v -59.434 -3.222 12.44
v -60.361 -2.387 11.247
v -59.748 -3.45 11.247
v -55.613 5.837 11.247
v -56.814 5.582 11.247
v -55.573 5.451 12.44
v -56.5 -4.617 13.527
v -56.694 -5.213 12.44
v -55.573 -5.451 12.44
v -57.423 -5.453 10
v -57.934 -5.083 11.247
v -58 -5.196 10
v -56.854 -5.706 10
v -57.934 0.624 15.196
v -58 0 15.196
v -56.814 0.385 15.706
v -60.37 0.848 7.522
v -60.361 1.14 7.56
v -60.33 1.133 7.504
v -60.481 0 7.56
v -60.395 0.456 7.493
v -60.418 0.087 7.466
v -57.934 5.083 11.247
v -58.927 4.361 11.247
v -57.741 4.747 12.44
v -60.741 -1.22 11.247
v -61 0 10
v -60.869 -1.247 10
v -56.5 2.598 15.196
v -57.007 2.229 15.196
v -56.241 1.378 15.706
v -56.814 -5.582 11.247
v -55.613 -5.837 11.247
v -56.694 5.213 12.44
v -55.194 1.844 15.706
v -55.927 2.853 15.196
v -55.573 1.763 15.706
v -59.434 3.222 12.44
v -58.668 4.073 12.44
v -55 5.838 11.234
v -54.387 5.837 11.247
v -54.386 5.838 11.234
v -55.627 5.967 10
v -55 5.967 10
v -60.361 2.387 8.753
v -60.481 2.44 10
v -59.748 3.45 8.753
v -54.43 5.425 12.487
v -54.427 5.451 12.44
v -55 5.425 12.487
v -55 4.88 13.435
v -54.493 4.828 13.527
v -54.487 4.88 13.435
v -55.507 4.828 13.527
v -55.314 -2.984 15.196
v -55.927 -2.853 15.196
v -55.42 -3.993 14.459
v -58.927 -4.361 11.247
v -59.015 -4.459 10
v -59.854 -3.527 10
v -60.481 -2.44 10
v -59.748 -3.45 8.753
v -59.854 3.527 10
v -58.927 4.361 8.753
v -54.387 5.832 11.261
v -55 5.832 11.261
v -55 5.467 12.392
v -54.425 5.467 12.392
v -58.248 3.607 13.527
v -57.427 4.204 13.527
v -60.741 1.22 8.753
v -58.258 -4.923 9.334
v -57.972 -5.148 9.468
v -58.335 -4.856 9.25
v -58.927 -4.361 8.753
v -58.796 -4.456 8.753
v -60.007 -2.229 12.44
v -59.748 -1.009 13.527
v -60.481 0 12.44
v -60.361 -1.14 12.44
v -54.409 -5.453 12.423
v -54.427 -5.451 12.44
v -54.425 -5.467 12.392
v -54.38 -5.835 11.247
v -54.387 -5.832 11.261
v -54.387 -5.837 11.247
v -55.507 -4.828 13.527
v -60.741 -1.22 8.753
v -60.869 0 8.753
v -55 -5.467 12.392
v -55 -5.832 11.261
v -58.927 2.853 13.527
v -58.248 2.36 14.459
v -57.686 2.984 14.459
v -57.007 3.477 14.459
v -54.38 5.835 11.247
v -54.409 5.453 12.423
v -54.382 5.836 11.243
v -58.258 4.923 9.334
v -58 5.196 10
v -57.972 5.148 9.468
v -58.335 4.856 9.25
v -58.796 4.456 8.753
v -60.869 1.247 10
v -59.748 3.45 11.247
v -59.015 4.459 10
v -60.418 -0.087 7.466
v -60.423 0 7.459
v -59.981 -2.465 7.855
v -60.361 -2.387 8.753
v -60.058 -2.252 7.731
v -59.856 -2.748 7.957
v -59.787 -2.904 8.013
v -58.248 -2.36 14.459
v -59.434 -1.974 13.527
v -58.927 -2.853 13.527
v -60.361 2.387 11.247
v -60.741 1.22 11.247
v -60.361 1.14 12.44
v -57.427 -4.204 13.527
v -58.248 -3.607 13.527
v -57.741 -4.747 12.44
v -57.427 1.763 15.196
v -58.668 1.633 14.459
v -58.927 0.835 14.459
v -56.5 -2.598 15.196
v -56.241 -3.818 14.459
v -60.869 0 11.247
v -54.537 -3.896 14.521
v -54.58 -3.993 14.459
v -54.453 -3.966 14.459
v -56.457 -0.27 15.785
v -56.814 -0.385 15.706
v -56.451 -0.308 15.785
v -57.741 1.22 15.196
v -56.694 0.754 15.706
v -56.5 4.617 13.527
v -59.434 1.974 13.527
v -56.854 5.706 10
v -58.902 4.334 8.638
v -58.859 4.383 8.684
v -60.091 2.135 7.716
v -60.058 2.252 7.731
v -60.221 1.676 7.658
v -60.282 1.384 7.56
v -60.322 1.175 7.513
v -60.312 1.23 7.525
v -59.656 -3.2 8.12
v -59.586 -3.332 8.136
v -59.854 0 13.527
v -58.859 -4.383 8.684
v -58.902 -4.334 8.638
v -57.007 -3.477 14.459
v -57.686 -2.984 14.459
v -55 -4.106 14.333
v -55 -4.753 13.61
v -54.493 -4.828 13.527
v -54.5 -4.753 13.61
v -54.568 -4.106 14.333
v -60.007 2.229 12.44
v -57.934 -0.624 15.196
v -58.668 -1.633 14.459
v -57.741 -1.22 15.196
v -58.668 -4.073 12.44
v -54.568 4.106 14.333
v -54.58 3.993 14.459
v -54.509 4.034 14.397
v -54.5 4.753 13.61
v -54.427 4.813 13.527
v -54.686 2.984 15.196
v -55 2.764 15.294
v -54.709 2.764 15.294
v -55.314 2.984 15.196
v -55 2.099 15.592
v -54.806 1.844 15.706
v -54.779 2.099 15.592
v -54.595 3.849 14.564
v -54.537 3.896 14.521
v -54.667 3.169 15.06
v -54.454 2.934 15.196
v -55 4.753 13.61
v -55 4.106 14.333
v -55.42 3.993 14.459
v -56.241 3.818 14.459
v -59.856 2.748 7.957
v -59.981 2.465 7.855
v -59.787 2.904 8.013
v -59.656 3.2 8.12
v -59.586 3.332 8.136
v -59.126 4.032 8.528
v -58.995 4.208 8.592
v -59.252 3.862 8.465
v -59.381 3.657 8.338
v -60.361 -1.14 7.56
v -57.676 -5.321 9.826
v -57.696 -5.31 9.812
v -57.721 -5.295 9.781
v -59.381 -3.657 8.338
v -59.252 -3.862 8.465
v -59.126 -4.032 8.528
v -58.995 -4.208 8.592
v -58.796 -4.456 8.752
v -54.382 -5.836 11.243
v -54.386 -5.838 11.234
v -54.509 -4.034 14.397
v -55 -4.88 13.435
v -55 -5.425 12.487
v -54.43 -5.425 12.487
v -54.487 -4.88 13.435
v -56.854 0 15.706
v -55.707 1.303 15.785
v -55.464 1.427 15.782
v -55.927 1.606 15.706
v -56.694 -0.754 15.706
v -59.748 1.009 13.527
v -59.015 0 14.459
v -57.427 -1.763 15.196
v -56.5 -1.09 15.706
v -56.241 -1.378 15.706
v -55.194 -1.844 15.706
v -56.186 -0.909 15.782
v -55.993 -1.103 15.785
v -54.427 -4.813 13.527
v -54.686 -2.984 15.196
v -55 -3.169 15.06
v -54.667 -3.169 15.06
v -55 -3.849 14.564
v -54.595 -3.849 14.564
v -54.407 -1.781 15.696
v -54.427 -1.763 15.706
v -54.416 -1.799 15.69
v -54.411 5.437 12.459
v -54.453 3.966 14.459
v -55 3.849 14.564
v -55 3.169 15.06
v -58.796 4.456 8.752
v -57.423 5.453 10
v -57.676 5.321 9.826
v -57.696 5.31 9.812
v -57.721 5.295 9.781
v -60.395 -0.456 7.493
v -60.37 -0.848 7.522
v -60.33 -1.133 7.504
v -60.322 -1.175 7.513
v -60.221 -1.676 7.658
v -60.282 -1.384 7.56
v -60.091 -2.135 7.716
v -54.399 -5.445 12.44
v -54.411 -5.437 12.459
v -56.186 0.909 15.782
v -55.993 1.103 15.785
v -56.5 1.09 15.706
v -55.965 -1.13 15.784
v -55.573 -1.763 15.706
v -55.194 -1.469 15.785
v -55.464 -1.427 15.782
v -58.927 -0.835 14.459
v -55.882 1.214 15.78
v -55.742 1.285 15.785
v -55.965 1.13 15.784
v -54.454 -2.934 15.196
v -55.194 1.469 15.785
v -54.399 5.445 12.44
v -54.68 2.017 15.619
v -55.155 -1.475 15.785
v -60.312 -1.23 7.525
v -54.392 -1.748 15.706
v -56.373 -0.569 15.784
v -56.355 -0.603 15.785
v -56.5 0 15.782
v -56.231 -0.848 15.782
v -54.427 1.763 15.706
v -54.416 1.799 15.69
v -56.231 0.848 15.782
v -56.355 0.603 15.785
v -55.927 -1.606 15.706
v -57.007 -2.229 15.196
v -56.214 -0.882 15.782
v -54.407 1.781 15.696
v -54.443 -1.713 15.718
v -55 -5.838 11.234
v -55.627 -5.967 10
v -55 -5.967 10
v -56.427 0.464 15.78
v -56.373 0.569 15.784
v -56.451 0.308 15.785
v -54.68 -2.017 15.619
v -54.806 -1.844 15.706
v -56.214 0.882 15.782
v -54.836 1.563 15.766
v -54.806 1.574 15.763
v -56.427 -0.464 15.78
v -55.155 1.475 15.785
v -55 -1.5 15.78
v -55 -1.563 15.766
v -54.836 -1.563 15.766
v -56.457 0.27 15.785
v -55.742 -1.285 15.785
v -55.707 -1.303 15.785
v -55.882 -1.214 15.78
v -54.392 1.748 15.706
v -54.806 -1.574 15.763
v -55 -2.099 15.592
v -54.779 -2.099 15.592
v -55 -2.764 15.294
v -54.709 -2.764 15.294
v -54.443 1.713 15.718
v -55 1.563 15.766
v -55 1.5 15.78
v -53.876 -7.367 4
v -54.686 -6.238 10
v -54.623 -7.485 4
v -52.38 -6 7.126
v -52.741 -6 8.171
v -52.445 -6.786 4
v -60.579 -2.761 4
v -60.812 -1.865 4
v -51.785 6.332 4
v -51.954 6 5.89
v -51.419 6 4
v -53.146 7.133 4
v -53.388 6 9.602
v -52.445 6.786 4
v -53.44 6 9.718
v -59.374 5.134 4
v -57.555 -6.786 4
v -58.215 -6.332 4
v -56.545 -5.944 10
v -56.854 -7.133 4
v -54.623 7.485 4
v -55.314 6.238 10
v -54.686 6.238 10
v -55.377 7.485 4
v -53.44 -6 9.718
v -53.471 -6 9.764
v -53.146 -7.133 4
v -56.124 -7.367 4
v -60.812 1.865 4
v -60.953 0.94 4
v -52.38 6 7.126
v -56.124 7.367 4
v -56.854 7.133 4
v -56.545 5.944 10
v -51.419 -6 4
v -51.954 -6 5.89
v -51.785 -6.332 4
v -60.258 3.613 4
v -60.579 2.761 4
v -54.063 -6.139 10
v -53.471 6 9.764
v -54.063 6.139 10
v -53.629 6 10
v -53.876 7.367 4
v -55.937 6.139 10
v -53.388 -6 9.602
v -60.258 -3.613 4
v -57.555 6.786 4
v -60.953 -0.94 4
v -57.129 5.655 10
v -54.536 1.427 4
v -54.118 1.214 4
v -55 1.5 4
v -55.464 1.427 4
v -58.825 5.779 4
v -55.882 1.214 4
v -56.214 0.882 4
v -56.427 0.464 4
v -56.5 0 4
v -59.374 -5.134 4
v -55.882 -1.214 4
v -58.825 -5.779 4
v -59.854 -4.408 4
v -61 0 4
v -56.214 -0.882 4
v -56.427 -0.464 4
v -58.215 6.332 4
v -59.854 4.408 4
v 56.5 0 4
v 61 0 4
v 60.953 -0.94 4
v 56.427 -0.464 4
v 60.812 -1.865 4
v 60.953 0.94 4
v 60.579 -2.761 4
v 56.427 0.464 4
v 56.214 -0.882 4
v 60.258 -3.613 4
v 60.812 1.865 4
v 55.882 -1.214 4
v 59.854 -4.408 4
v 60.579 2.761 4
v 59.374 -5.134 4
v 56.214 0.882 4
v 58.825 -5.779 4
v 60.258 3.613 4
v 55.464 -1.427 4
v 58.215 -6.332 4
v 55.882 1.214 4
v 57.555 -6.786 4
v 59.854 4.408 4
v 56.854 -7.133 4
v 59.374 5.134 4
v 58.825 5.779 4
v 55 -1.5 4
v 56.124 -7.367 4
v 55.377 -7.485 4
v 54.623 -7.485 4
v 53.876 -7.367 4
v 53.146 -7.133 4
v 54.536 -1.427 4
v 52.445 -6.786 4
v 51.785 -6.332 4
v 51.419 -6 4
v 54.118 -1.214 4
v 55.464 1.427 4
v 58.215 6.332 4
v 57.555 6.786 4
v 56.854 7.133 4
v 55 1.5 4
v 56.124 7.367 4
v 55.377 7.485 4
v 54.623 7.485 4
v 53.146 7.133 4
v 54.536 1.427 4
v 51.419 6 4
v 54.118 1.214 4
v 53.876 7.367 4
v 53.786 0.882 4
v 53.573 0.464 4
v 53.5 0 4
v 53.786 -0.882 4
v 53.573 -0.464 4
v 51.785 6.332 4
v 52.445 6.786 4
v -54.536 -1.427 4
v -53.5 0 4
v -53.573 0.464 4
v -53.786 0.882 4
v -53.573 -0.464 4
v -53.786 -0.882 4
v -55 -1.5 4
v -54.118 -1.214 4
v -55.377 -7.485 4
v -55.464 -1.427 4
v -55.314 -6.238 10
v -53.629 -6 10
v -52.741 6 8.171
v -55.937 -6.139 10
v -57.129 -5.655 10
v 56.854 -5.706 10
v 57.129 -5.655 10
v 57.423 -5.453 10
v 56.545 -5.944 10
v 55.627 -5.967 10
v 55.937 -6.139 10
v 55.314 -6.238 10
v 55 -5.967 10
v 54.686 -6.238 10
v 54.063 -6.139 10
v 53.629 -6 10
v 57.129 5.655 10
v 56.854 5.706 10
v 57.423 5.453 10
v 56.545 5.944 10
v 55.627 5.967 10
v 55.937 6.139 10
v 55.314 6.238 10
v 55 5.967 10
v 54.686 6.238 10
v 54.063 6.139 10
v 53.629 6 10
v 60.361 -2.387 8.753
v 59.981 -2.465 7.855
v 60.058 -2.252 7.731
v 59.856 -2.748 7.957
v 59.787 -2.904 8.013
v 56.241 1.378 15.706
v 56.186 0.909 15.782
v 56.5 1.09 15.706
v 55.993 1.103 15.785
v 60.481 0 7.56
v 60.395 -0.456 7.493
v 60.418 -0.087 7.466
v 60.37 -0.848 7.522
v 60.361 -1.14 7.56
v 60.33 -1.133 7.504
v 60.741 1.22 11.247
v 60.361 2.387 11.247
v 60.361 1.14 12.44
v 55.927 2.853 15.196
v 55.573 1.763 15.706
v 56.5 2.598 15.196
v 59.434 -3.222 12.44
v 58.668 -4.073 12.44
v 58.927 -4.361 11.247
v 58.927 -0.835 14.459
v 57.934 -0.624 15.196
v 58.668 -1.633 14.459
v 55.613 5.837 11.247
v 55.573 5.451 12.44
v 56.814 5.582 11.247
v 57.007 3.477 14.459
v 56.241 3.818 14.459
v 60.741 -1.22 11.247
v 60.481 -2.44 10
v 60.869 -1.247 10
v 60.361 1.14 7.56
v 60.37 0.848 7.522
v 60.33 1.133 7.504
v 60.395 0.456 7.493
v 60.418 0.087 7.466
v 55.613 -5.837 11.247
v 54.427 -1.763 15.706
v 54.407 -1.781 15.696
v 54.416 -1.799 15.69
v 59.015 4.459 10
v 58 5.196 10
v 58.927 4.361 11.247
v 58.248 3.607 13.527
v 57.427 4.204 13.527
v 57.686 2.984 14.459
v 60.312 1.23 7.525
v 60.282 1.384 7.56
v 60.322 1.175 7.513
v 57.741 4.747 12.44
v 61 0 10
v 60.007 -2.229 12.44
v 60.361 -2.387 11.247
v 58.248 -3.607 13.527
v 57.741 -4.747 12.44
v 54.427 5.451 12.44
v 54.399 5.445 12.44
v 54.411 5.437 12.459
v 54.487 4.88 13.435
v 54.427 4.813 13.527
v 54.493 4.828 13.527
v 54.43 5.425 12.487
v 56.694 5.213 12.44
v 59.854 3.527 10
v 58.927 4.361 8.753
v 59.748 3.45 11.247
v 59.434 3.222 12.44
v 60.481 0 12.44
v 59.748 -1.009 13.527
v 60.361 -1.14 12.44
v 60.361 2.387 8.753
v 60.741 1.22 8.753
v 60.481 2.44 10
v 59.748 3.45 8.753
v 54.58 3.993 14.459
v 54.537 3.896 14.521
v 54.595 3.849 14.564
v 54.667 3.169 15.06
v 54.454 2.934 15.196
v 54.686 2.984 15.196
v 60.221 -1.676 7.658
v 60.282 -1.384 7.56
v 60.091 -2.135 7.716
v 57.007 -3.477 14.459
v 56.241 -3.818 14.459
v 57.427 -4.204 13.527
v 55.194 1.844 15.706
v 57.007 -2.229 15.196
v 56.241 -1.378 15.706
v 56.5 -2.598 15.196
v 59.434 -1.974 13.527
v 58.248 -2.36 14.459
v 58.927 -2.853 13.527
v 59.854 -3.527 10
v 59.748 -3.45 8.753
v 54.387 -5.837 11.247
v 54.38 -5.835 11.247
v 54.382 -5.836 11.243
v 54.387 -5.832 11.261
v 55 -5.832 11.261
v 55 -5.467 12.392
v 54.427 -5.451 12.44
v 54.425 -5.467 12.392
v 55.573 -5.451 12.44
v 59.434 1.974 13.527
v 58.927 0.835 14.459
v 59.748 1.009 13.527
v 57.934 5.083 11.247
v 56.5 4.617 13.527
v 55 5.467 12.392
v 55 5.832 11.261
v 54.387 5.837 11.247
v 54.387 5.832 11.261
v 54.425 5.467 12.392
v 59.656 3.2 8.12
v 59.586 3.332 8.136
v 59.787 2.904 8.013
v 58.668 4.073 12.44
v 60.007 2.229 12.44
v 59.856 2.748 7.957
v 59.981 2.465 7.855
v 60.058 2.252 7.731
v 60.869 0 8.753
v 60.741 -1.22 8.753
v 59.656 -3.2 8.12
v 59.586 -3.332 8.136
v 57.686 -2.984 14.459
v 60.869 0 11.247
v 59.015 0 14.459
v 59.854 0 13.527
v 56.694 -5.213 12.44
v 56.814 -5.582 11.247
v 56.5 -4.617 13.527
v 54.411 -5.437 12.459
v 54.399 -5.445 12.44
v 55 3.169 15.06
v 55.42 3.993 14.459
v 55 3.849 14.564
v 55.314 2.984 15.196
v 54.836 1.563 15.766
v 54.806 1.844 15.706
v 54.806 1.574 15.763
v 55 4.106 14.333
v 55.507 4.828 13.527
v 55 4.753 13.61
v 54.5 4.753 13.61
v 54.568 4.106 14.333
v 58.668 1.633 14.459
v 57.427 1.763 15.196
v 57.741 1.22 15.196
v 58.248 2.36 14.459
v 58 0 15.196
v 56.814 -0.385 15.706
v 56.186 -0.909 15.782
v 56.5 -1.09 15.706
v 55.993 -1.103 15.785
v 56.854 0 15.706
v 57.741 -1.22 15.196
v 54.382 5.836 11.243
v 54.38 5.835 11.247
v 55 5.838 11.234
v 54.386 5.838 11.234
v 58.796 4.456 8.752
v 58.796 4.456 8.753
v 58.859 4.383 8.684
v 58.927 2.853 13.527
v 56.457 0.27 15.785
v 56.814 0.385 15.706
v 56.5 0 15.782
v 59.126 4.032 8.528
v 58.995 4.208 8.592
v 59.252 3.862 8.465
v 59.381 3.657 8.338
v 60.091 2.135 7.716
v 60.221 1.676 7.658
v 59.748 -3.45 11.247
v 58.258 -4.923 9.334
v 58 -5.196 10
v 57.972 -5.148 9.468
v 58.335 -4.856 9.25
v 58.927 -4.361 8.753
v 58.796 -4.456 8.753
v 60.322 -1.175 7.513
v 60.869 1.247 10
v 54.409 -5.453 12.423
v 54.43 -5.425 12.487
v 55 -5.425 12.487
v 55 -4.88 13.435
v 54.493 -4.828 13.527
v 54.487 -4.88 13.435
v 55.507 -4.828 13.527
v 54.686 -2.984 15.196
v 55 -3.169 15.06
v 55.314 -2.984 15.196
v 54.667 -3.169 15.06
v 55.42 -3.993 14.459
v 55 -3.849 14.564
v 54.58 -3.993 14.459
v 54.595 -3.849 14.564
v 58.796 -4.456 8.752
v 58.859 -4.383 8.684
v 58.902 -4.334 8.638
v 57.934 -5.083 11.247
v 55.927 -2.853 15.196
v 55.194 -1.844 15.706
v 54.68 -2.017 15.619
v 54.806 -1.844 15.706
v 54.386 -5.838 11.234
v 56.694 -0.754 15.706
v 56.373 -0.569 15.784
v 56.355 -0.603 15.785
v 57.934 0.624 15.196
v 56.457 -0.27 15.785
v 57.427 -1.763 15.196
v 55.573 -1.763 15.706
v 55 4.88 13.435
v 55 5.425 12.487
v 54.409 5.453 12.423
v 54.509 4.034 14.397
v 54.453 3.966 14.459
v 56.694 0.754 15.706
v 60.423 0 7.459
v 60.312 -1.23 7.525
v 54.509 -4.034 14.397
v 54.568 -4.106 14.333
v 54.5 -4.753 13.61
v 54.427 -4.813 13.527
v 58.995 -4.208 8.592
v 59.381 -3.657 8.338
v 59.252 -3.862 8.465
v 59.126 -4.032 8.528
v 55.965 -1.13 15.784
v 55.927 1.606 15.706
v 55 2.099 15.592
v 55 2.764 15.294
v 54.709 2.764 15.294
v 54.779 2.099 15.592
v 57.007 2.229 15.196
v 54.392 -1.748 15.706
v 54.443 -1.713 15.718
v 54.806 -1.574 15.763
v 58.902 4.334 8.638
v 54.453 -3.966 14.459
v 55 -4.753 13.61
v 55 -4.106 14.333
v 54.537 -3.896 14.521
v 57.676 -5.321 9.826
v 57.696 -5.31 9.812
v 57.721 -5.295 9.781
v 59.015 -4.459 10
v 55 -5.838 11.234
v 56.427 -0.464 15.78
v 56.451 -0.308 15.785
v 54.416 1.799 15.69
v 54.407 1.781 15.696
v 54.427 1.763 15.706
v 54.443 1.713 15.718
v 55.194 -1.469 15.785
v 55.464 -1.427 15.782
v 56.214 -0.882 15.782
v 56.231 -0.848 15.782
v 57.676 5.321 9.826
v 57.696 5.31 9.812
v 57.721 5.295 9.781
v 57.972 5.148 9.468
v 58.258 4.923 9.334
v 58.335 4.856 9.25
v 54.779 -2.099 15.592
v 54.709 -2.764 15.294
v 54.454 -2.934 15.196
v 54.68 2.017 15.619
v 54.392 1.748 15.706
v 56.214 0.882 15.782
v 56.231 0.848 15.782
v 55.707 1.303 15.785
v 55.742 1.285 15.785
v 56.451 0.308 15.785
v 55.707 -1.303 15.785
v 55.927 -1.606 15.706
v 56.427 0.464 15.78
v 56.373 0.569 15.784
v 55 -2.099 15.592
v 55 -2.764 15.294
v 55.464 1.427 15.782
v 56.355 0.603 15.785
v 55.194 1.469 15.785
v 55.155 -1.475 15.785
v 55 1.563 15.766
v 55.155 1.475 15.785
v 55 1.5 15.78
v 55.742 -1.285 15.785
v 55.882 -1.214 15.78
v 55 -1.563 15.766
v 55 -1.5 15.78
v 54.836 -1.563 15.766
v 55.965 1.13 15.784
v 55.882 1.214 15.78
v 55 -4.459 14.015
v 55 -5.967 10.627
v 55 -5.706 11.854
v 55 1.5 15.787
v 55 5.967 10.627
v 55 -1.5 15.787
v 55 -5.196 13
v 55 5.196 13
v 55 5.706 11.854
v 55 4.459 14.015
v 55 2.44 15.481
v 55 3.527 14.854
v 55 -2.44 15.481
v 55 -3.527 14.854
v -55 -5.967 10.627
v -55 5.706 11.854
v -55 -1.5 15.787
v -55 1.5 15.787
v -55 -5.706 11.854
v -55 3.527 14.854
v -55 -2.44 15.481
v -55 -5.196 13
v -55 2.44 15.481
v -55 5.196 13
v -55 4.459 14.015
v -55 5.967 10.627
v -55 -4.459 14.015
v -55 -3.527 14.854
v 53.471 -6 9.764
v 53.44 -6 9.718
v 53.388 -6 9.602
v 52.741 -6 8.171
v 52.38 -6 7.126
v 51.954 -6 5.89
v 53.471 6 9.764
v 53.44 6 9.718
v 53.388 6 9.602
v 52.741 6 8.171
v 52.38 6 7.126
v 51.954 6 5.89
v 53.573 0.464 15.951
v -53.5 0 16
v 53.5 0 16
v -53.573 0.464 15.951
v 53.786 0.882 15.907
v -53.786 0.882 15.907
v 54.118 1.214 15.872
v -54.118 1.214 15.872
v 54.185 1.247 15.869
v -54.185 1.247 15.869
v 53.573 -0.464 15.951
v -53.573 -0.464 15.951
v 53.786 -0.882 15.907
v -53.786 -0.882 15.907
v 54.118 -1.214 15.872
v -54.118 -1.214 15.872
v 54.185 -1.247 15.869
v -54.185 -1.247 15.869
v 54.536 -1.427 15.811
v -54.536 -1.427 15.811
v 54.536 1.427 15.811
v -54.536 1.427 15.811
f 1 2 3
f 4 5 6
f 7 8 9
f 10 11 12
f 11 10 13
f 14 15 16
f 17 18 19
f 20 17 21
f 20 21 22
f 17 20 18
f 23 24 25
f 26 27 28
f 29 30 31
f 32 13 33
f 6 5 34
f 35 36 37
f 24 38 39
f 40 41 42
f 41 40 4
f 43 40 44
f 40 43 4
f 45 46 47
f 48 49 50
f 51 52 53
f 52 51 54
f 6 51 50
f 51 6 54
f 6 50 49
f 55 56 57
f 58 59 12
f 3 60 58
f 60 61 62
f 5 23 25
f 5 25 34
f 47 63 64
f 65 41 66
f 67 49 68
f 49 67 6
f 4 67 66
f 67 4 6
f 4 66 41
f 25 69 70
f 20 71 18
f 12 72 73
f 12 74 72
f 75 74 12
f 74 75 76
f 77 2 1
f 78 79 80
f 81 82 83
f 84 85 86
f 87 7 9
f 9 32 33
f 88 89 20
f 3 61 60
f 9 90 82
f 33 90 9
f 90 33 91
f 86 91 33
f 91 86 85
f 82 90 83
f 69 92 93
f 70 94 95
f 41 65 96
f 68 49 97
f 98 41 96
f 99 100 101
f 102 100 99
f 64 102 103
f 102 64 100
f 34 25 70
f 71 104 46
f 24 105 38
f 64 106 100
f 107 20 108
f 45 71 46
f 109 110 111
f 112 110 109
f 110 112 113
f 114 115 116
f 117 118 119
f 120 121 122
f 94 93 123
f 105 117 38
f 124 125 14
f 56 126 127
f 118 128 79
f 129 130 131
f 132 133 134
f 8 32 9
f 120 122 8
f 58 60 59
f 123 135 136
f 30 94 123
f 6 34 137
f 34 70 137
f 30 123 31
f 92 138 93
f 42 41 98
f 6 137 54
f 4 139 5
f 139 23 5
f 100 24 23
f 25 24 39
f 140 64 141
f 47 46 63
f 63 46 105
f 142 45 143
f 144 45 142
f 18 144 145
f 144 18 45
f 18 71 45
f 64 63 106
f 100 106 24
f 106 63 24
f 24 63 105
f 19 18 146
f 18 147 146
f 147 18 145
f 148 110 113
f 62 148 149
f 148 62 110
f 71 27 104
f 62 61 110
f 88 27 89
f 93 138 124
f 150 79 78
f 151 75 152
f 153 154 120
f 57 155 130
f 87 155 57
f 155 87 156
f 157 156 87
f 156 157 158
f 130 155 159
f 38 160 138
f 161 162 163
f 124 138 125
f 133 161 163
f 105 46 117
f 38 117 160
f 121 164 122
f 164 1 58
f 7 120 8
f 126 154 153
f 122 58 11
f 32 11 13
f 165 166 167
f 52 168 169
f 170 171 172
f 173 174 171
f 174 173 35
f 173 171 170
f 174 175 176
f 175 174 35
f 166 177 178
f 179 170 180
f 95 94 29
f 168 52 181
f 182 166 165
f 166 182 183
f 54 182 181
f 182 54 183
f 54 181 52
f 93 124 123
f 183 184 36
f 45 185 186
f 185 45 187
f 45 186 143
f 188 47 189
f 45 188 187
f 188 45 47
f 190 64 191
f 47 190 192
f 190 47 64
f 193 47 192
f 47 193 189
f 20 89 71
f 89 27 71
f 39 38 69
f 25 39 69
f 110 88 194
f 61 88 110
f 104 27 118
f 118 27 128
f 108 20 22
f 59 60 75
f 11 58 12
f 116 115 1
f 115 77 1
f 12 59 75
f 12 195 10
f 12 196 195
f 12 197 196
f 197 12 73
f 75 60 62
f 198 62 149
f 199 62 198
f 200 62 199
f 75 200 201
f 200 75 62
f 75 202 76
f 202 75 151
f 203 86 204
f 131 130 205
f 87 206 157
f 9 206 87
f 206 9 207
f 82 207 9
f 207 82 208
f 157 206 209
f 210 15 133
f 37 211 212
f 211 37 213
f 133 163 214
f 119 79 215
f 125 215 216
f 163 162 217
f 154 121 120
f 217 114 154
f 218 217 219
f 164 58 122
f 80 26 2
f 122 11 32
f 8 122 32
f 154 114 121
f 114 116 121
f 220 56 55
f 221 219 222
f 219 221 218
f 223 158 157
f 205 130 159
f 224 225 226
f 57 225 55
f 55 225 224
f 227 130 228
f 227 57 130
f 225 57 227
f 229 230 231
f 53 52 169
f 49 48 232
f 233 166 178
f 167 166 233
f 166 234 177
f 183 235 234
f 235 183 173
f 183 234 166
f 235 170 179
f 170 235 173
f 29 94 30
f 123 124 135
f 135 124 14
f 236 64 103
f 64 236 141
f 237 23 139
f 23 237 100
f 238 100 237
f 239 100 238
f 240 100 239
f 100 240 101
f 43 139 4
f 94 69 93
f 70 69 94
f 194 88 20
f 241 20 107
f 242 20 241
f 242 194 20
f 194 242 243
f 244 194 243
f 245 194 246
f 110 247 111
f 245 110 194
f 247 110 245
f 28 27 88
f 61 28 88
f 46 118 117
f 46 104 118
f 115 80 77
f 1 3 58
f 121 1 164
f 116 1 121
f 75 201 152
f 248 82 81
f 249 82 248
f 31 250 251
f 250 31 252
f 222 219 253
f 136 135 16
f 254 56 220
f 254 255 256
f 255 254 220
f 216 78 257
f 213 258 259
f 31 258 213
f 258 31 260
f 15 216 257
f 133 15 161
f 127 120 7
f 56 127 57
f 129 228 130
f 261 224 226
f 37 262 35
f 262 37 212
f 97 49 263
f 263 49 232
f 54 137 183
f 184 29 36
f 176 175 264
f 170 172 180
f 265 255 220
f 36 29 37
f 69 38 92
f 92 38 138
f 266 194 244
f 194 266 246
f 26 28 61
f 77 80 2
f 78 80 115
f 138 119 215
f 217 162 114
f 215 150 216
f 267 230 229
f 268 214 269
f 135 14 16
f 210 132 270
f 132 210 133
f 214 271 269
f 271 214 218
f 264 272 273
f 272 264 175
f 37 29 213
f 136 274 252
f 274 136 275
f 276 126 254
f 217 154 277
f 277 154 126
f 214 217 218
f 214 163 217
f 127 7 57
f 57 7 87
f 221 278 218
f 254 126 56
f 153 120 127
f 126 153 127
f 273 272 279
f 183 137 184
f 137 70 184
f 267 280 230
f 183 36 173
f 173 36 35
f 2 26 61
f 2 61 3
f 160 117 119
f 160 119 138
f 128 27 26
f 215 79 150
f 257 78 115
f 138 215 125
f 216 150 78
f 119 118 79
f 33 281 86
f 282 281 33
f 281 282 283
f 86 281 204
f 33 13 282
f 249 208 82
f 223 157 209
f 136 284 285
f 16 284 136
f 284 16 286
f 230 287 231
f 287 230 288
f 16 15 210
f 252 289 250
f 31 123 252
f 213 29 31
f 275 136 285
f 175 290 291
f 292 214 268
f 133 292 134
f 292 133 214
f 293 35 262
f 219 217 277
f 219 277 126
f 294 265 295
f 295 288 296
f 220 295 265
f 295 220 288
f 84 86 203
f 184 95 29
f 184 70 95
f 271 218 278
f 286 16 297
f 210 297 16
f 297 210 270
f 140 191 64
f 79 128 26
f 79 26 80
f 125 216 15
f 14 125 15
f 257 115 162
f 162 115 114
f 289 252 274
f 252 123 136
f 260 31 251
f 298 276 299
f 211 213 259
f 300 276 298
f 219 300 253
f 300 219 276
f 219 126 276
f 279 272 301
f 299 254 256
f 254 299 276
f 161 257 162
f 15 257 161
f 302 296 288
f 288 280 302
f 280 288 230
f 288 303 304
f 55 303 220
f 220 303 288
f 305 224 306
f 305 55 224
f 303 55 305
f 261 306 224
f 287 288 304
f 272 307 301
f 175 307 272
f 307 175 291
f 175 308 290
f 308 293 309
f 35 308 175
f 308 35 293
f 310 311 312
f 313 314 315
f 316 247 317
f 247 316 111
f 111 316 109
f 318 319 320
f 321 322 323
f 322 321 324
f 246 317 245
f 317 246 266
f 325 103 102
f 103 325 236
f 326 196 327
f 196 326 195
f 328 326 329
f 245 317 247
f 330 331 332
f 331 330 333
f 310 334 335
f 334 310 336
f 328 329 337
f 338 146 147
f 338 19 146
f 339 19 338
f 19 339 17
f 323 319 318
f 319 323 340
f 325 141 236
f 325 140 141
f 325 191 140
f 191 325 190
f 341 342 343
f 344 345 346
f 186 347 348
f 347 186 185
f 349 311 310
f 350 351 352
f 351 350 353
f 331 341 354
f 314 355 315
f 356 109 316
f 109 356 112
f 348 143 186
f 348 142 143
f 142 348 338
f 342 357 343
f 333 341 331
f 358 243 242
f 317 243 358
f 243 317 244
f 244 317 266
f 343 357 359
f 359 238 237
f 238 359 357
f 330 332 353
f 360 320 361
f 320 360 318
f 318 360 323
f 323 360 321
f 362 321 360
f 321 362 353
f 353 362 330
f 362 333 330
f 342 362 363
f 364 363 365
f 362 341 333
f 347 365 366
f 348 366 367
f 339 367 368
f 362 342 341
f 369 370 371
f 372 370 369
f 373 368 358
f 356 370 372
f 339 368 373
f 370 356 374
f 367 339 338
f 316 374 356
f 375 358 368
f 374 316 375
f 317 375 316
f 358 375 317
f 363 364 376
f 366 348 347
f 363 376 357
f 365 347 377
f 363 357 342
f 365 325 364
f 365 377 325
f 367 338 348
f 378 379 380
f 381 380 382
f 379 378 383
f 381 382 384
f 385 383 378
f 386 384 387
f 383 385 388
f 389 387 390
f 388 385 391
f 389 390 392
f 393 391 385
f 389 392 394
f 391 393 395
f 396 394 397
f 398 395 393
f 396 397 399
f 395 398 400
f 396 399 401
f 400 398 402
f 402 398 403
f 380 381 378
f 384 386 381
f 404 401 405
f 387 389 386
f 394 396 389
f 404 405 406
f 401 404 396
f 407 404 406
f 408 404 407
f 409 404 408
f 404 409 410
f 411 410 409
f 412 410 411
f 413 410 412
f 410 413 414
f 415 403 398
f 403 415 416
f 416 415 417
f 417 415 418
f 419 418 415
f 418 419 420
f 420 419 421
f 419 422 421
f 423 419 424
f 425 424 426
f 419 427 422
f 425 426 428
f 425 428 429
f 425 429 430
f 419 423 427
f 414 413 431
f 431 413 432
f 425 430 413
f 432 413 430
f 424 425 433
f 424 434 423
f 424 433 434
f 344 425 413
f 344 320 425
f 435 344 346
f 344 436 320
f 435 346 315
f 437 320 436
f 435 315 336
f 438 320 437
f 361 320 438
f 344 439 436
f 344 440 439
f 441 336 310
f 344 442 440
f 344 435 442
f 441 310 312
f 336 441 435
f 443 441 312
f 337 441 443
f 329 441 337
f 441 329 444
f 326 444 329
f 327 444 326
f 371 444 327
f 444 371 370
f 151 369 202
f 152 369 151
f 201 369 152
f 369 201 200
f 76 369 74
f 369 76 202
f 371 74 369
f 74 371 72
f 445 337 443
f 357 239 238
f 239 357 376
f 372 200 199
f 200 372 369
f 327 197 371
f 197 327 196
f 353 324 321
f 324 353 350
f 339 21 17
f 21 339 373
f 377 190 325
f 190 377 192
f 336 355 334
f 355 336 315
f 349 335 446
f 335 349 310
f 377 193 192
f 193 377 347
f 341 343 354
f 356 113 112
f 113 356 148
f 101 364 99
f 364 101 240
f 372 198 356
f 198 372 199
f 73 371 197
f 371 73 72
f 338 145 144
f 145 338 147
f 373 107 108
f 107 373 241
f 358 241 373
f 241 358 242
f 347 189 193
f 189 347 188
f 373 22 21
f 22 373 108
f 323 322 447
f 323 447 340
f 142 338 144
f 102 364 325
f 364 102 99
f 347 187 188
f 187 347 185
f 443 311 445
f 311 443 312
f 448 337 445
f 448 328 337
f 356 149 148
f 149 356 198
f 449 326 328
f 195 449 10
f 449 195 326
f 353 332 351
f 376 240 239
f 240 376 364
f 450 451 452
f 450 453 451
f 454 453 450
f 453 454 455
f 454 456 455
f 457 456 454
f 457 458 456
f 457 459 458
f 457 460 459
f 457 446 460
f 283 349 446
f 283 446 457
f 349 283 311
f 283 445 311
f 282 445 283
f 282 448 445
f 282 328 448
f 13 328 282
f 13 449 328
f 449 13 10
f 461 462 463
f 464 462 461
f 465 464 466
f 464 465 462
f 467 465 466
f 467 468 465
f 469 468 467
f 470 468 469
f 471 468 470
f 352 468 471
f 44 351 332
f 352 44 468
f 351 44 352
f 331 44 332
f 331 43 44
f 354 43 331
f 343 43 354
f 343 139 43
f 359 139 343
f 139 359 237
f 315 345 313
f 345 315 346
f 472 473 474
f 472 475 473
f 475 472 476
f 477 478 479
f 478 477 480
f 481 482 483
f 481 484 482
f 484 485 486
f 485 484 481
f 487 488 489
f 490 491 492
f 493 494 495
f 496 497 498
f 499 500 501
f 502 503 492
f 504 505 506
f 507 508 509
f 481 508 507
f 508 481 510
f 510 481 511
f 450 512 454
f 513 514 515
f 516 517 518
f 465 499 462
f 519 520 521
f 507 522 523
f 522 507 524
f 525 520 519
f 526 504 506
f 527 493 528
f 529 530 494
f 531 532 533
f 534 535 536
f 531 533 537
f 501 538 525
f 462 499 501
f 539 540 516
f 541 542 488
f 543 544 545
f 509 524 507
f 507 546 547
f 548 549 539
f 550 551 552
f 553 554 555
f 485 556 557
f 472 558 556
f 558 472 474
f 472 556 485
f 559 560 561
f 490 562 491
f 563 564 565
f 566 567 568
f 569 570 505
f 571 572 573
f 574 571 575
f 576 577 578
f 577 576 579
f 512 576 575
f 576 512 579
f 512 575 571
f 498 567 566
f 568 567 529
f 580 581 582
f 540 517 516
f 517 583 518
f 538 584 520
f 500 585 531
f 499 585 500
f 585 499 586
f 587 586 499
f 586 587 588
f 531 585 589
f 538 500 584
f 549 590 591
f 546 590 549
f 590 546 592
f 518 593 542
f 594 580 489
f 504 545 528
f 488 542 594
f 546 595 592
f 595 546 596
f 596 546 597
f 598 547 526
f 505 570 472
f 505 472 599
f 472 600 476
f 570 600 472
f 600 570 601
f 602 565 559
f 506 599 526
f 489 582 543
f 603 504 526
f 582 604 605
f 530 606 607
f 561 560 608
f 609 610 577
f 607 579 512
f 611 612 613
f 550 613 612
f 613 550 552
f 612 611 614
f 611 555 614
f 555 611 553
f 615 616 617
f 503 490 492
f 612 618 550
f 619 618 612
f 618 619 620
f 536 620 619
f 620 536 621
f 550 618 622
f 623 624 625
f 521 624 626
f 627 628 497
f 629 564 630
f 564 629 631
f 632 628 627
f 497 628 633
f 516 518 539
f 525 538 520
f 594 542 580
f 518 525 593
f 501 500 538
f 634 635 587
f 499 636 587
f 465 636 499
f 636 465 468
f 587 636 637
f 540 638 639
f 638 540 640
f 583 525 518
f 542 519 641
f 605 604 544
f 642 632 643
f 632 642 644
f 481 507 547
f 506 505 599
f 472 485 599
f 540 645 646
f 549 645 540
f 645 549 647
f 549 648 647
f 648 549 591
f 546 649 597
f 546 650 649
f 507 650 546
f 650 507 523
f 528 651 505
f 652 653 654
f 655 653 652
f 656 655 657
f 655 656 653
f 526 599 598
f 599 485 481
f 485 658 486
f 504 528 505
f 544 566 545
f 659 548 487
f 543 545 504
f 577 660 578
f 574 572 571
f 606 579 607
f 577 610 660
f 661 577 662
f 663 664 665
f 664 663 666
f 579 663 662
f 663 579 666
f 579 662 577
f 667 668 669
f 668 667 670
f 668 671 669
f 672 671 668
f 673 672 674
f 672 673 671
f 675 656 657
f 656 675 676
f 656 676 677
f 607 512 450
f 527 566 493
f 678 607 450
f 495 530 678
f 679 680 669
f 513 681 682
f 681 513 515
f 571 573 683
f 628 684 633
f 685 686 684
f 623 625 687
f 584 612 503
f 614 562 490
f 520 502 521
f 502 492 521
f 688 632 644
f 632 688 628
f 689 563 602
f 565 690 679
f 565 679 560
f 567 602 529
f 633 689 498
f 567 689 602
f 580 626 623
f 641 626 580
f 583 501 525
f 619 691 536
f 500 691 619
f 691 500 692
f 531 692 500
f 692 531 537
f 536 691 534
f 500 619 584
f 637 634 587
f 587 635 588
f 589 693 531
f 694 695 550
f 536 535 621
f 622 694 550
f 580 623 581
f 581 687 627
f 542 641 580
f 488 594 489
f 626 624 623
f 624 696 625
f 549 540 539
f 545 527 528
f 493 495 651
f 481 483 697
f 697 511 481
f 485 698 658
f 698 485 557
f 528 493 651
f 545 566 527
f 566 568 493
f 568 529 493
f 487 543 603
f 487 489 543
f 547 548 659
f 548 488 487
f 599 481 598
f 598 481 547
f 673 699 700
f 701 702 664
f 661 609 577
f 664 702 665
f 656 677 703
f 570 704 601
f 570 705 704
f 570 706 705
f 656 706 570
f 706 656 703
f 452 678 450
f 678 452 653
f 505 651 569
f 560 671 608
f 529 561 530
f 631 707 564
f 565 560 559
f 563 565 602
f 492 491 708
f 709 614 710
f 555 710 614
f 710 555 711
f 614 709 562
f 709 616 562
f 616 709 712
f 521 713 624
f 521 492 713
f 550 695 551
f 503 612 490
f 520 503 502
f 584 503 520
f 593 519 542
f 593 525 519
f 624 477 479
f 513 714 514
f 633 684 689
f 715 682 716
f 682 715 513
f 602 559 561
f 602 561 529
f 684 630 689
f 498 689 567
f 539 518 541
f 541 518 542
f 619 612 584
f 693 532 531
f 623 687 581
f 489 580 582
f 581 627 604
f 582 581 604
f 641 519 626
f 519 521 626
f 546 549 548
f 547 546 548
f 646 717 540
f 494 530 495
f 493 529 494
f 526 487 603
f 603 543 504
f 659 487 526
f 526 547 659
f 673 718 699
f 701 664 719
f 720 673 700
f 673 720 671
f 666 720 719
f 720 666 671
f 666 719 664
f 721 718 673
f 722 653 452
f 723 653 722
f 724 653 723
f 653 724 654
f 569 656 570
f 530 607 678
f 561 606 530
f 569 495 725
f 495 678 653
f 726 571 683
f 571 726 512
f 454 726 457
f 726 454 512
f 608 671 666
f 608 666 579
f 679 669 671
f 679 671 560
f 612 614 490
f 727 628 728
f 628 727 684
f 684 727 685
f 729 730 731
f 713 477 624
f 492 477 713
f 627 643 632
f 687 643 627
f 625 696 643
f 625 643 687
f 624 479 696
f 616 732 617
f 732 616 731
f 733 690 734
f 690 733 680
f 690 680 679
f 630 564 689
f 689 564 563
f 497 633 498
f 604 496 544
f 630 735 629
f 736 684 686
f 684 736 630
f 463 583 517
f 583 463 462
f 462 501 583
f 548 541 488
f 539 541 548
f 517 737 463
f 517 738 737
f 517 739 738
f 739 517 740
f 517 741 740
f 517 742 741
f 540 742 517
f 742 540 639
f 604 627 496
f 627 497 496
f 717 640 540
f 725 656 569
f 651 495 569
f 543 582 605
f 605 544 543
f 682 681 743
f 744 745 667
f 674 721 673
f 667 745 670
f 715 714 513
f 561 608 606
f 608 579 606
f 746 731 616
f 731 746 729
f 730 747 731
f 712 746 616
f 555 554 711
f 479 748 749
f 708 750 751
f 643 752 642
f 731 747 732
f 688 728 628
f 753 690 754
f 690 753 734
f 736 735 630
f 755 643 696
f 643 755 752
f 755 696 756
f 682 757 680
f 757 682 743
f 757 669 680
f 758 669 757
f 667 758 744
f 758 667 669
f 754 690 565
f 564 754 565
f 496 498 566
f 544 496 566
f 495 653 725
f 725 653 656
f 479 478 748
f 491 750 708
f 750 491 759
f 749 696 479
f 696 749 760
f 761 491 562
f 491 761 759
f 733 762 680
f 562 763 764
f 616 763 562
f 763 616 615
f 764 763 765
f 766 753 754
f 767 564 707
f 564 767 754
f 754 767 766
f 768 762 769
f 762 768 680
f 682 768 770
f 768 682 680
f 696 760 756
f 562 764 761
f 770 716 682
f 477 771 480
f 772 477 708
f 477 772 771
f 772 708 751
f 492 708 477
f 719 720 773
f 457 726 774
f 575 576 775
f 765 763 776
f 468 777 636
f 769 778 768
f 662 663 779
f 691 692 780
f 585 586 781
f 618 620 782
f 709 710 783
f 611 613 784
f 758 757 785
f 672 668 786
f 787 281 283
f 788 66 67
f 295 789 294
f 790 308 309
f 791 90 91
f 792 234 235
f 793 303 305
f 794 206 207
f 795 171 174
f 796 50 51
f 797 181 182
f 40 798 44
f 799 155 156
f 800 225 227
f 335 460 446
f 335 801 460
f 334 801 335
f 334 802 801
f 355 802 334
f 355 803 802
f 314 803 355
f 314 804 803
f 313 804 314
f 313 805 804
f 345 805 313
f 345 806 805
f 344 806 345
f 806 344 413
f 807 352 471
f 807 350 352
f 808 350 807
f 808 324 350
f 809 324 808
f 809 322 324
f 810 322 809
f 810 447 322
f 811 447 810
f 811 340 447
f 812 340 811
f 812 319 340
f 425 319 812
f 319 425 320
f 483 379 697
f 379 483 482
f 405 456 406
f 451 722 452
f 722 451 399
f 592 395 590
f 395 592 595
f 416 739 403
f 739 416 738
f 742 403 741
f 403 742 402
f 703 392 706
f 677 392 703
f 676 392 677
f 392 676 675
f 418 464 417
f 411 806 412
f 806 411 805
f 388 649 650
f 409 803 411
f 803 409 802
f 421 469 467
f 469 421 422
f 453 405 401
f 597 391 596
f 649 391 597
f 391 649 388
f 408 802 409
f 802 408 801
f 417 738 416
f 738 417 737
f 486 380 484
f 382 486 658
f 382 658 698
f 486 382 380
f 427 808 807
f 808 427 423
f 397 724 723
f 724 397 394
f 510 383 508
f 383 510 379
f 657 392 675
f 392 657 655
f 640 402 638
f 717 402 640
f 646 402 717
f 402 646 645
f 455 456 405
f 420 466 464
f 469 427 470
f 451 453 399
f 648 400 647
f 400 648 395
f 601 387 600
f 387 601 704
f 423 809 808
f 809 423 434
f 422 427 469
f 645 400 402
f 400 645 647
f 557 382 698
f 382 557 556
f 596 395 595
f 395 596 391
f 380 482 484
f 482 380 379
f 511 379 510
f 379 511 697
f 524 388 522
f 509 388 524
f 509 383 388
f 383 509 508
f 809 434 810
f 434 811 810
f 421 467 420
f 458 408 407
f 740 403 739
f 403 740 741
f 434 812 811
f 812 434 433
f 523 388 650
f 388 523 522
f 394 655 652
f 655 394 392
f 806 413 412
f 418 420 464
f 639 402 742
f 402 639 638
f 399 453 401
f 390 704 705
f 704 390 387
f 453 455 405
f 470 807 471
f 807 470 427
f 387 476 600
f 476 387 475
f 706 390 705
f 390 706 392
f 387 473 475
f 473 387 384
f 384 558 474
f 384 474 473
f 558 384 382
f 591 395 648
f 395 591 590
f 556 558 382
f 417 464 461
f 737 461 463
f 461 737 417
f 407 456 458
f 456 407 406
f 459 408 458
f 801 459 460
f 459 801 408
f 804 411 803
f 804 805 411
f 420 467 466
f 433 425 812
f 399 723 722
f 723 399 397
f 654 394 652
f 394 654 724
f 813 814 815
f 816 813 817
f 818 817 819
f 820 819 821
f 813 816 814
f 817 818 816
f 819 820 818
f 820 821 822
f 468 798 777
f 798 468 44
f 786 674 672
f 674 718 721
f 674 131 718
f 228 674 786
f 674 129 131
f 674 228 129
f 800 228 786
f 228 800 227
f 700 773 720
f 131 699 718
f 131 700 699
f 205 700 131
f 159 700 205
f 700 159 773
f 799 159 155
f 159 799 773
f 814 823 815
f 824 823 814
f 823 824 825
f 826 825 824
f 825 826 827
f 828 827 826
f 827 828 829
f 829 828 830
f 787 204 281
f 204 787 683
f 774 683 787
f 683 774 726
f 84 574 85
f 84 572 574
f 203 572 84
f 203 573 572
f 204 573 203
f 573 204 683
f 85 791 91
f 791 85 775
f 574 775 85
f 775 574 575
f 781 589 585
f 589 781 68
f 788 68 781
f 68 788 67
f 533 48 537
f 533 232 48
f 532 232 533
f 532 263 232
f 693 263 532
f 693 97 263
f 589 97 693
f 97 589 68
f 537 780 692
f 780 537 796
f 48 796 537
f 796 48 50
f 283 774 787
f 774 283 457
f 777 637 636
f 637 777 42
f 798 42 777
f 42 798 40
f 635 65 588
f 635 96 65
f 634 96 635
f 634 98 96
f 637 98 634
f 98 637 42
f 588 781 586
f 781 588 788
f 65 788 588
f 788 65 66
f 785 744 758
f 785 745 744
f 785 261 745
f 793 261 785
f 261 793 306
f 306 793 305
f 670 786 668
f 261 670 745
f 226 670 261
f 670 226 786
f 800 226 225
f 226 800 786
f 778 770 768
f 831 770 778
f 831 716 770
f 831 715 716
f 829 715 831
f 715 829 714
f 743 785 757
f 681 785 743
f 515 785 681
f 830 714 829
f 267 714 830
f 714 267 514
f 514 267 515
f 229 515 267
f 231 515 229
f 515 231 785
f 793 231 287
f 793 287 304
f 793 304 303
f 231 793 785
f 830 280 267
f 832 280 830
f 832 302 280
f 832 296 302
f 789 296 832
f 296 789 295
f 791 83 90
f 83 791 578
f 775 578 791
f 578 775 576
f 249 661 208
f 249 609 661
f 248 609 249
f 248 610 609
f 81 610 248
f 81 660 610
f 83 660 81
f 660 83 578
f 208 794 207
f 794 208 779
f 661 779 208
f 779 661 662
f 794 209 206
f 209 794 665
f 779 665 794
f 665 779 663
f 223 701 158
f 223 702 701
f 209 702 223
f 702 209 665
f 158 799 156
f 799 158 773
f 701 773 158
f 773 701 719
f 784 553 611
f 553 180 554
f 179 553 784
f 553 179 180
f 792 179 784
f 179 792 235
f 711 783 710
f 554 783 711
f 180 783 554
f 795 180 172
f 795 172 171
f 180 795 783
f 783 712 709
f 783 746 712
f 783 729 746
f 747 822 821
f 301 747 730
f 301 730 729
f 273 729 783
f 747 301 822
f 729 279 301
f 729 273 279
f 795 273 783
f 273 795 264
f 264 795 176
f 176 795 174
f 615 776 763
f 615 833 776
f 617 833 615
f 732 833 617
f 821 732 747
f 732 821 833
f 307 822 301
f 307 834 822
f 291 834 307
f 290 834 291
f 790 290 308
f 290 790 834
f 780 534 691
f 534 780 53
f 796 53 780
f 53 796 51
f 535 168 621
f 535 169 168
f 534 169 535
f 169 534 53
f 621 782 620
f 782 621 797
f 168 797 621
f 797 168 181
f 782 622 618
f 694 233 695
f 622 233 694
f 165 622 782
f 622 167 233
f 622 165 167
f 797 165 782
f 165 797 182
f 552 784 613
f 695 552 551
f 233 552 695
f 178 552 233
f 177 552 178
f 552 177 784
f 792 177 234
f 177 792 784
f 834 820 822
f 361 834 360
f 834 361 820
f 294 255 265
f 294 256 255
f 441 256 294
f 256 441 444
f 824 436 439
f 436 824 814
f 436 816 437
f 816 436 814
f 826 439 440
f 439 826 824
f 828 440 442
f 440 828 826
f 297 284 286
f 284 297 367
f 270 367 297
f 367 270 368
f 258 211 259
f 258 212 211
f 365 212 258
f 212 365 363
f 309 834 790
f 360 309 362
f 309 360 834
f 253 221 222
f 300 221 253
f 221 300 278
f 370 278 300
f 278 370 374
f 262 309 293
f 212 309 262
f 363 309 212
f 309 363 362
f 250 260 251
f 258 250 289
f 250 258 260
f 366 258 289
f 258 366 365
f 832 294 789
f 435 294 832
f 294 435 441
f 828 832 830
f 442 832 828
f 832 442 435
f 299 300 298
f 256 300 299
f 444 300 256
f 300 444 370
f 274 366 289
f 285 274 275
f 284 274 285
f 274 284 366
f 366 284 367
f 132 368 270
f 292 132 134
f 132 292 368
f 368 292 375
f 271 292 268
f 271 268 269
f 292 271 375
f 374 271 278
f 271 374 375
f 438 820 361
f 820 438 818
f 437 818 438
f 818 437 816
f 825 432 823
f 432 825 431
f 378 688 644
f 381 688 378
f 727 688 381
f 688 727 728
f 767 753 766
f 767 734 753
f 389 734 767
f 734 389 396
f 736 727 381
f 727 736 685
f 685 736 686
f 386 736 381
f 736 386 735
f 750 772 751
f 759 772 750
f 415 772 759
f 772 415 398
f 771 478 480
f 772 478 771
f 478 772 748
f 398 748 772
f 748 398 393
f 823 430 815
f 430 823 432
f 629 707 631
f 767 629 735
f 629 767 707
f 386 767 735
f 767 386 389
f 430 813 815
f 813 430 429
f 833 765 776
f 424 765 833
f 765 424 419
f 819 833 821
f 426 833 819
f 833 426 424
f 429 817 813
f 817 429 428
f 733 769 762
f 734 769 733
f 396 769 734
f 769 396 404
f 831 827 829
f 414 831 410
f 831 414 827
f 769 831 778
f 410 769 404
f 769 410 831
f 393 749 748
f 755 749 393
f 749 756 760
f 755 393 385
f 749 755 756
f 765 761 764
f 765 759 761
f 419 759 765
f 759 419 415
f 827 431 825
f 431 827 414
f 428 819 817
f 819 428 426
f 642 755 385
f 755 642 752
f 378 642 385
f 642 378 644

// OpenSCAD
//90,136,120;
difference() {
  translate([0,0,-15]) scale(1.1) crucible();
  scale(1.095) crucible();
  translate([0,0,-16]) cylinder(d=120,h=12,$fn=100);
}
translate([0,0,-4]) for(r=[0,180]) rotate([0,0,r]) linear_extrude(154,twist=180,scale=[1.3,1.3],$fn=100) translate([55,0]) scale([1,1.25]) circle(d=12,$fn=40);
! rotate([180,0]) difference() {
    *translate([-64,-8,-20]) cube([128,16,14]);
translate([55,0,-10]) {
  sphere(d=12,$fn=30);
  translate([-110,-6]) cube([110,12,6]);
  scale([1,1.25,1]) cylinder(d1=10,d2=12,h=6,$fn=50);
  rotate([0,-90]) cylinder(d=12,h=110,$fn=30);
  translate([-110,0]) {
    sphere(d=12,$fn=30);
  scale([1,1.25,1]) cylinder(d1=10,d2=12,h=6,$fn=50);
  }
}
  for(x=[-55,55]) translate([x,0,-20]) cylinder(d=3,h=20,$fn=20);
}

module crucible() {
  hull() {
cylinder(d1=90,d2=100,h=20,$fn=100);
translate([0,0,20]) cylinder(d1=100,d2=110,h=30,$fn=100);
translate([0,0,50]) cylinder(d1=110,d2=120,h=50,$fn=100);
translate([0,0,100]) cylinder(d=120,h=50,$fn=100);
  }
}
